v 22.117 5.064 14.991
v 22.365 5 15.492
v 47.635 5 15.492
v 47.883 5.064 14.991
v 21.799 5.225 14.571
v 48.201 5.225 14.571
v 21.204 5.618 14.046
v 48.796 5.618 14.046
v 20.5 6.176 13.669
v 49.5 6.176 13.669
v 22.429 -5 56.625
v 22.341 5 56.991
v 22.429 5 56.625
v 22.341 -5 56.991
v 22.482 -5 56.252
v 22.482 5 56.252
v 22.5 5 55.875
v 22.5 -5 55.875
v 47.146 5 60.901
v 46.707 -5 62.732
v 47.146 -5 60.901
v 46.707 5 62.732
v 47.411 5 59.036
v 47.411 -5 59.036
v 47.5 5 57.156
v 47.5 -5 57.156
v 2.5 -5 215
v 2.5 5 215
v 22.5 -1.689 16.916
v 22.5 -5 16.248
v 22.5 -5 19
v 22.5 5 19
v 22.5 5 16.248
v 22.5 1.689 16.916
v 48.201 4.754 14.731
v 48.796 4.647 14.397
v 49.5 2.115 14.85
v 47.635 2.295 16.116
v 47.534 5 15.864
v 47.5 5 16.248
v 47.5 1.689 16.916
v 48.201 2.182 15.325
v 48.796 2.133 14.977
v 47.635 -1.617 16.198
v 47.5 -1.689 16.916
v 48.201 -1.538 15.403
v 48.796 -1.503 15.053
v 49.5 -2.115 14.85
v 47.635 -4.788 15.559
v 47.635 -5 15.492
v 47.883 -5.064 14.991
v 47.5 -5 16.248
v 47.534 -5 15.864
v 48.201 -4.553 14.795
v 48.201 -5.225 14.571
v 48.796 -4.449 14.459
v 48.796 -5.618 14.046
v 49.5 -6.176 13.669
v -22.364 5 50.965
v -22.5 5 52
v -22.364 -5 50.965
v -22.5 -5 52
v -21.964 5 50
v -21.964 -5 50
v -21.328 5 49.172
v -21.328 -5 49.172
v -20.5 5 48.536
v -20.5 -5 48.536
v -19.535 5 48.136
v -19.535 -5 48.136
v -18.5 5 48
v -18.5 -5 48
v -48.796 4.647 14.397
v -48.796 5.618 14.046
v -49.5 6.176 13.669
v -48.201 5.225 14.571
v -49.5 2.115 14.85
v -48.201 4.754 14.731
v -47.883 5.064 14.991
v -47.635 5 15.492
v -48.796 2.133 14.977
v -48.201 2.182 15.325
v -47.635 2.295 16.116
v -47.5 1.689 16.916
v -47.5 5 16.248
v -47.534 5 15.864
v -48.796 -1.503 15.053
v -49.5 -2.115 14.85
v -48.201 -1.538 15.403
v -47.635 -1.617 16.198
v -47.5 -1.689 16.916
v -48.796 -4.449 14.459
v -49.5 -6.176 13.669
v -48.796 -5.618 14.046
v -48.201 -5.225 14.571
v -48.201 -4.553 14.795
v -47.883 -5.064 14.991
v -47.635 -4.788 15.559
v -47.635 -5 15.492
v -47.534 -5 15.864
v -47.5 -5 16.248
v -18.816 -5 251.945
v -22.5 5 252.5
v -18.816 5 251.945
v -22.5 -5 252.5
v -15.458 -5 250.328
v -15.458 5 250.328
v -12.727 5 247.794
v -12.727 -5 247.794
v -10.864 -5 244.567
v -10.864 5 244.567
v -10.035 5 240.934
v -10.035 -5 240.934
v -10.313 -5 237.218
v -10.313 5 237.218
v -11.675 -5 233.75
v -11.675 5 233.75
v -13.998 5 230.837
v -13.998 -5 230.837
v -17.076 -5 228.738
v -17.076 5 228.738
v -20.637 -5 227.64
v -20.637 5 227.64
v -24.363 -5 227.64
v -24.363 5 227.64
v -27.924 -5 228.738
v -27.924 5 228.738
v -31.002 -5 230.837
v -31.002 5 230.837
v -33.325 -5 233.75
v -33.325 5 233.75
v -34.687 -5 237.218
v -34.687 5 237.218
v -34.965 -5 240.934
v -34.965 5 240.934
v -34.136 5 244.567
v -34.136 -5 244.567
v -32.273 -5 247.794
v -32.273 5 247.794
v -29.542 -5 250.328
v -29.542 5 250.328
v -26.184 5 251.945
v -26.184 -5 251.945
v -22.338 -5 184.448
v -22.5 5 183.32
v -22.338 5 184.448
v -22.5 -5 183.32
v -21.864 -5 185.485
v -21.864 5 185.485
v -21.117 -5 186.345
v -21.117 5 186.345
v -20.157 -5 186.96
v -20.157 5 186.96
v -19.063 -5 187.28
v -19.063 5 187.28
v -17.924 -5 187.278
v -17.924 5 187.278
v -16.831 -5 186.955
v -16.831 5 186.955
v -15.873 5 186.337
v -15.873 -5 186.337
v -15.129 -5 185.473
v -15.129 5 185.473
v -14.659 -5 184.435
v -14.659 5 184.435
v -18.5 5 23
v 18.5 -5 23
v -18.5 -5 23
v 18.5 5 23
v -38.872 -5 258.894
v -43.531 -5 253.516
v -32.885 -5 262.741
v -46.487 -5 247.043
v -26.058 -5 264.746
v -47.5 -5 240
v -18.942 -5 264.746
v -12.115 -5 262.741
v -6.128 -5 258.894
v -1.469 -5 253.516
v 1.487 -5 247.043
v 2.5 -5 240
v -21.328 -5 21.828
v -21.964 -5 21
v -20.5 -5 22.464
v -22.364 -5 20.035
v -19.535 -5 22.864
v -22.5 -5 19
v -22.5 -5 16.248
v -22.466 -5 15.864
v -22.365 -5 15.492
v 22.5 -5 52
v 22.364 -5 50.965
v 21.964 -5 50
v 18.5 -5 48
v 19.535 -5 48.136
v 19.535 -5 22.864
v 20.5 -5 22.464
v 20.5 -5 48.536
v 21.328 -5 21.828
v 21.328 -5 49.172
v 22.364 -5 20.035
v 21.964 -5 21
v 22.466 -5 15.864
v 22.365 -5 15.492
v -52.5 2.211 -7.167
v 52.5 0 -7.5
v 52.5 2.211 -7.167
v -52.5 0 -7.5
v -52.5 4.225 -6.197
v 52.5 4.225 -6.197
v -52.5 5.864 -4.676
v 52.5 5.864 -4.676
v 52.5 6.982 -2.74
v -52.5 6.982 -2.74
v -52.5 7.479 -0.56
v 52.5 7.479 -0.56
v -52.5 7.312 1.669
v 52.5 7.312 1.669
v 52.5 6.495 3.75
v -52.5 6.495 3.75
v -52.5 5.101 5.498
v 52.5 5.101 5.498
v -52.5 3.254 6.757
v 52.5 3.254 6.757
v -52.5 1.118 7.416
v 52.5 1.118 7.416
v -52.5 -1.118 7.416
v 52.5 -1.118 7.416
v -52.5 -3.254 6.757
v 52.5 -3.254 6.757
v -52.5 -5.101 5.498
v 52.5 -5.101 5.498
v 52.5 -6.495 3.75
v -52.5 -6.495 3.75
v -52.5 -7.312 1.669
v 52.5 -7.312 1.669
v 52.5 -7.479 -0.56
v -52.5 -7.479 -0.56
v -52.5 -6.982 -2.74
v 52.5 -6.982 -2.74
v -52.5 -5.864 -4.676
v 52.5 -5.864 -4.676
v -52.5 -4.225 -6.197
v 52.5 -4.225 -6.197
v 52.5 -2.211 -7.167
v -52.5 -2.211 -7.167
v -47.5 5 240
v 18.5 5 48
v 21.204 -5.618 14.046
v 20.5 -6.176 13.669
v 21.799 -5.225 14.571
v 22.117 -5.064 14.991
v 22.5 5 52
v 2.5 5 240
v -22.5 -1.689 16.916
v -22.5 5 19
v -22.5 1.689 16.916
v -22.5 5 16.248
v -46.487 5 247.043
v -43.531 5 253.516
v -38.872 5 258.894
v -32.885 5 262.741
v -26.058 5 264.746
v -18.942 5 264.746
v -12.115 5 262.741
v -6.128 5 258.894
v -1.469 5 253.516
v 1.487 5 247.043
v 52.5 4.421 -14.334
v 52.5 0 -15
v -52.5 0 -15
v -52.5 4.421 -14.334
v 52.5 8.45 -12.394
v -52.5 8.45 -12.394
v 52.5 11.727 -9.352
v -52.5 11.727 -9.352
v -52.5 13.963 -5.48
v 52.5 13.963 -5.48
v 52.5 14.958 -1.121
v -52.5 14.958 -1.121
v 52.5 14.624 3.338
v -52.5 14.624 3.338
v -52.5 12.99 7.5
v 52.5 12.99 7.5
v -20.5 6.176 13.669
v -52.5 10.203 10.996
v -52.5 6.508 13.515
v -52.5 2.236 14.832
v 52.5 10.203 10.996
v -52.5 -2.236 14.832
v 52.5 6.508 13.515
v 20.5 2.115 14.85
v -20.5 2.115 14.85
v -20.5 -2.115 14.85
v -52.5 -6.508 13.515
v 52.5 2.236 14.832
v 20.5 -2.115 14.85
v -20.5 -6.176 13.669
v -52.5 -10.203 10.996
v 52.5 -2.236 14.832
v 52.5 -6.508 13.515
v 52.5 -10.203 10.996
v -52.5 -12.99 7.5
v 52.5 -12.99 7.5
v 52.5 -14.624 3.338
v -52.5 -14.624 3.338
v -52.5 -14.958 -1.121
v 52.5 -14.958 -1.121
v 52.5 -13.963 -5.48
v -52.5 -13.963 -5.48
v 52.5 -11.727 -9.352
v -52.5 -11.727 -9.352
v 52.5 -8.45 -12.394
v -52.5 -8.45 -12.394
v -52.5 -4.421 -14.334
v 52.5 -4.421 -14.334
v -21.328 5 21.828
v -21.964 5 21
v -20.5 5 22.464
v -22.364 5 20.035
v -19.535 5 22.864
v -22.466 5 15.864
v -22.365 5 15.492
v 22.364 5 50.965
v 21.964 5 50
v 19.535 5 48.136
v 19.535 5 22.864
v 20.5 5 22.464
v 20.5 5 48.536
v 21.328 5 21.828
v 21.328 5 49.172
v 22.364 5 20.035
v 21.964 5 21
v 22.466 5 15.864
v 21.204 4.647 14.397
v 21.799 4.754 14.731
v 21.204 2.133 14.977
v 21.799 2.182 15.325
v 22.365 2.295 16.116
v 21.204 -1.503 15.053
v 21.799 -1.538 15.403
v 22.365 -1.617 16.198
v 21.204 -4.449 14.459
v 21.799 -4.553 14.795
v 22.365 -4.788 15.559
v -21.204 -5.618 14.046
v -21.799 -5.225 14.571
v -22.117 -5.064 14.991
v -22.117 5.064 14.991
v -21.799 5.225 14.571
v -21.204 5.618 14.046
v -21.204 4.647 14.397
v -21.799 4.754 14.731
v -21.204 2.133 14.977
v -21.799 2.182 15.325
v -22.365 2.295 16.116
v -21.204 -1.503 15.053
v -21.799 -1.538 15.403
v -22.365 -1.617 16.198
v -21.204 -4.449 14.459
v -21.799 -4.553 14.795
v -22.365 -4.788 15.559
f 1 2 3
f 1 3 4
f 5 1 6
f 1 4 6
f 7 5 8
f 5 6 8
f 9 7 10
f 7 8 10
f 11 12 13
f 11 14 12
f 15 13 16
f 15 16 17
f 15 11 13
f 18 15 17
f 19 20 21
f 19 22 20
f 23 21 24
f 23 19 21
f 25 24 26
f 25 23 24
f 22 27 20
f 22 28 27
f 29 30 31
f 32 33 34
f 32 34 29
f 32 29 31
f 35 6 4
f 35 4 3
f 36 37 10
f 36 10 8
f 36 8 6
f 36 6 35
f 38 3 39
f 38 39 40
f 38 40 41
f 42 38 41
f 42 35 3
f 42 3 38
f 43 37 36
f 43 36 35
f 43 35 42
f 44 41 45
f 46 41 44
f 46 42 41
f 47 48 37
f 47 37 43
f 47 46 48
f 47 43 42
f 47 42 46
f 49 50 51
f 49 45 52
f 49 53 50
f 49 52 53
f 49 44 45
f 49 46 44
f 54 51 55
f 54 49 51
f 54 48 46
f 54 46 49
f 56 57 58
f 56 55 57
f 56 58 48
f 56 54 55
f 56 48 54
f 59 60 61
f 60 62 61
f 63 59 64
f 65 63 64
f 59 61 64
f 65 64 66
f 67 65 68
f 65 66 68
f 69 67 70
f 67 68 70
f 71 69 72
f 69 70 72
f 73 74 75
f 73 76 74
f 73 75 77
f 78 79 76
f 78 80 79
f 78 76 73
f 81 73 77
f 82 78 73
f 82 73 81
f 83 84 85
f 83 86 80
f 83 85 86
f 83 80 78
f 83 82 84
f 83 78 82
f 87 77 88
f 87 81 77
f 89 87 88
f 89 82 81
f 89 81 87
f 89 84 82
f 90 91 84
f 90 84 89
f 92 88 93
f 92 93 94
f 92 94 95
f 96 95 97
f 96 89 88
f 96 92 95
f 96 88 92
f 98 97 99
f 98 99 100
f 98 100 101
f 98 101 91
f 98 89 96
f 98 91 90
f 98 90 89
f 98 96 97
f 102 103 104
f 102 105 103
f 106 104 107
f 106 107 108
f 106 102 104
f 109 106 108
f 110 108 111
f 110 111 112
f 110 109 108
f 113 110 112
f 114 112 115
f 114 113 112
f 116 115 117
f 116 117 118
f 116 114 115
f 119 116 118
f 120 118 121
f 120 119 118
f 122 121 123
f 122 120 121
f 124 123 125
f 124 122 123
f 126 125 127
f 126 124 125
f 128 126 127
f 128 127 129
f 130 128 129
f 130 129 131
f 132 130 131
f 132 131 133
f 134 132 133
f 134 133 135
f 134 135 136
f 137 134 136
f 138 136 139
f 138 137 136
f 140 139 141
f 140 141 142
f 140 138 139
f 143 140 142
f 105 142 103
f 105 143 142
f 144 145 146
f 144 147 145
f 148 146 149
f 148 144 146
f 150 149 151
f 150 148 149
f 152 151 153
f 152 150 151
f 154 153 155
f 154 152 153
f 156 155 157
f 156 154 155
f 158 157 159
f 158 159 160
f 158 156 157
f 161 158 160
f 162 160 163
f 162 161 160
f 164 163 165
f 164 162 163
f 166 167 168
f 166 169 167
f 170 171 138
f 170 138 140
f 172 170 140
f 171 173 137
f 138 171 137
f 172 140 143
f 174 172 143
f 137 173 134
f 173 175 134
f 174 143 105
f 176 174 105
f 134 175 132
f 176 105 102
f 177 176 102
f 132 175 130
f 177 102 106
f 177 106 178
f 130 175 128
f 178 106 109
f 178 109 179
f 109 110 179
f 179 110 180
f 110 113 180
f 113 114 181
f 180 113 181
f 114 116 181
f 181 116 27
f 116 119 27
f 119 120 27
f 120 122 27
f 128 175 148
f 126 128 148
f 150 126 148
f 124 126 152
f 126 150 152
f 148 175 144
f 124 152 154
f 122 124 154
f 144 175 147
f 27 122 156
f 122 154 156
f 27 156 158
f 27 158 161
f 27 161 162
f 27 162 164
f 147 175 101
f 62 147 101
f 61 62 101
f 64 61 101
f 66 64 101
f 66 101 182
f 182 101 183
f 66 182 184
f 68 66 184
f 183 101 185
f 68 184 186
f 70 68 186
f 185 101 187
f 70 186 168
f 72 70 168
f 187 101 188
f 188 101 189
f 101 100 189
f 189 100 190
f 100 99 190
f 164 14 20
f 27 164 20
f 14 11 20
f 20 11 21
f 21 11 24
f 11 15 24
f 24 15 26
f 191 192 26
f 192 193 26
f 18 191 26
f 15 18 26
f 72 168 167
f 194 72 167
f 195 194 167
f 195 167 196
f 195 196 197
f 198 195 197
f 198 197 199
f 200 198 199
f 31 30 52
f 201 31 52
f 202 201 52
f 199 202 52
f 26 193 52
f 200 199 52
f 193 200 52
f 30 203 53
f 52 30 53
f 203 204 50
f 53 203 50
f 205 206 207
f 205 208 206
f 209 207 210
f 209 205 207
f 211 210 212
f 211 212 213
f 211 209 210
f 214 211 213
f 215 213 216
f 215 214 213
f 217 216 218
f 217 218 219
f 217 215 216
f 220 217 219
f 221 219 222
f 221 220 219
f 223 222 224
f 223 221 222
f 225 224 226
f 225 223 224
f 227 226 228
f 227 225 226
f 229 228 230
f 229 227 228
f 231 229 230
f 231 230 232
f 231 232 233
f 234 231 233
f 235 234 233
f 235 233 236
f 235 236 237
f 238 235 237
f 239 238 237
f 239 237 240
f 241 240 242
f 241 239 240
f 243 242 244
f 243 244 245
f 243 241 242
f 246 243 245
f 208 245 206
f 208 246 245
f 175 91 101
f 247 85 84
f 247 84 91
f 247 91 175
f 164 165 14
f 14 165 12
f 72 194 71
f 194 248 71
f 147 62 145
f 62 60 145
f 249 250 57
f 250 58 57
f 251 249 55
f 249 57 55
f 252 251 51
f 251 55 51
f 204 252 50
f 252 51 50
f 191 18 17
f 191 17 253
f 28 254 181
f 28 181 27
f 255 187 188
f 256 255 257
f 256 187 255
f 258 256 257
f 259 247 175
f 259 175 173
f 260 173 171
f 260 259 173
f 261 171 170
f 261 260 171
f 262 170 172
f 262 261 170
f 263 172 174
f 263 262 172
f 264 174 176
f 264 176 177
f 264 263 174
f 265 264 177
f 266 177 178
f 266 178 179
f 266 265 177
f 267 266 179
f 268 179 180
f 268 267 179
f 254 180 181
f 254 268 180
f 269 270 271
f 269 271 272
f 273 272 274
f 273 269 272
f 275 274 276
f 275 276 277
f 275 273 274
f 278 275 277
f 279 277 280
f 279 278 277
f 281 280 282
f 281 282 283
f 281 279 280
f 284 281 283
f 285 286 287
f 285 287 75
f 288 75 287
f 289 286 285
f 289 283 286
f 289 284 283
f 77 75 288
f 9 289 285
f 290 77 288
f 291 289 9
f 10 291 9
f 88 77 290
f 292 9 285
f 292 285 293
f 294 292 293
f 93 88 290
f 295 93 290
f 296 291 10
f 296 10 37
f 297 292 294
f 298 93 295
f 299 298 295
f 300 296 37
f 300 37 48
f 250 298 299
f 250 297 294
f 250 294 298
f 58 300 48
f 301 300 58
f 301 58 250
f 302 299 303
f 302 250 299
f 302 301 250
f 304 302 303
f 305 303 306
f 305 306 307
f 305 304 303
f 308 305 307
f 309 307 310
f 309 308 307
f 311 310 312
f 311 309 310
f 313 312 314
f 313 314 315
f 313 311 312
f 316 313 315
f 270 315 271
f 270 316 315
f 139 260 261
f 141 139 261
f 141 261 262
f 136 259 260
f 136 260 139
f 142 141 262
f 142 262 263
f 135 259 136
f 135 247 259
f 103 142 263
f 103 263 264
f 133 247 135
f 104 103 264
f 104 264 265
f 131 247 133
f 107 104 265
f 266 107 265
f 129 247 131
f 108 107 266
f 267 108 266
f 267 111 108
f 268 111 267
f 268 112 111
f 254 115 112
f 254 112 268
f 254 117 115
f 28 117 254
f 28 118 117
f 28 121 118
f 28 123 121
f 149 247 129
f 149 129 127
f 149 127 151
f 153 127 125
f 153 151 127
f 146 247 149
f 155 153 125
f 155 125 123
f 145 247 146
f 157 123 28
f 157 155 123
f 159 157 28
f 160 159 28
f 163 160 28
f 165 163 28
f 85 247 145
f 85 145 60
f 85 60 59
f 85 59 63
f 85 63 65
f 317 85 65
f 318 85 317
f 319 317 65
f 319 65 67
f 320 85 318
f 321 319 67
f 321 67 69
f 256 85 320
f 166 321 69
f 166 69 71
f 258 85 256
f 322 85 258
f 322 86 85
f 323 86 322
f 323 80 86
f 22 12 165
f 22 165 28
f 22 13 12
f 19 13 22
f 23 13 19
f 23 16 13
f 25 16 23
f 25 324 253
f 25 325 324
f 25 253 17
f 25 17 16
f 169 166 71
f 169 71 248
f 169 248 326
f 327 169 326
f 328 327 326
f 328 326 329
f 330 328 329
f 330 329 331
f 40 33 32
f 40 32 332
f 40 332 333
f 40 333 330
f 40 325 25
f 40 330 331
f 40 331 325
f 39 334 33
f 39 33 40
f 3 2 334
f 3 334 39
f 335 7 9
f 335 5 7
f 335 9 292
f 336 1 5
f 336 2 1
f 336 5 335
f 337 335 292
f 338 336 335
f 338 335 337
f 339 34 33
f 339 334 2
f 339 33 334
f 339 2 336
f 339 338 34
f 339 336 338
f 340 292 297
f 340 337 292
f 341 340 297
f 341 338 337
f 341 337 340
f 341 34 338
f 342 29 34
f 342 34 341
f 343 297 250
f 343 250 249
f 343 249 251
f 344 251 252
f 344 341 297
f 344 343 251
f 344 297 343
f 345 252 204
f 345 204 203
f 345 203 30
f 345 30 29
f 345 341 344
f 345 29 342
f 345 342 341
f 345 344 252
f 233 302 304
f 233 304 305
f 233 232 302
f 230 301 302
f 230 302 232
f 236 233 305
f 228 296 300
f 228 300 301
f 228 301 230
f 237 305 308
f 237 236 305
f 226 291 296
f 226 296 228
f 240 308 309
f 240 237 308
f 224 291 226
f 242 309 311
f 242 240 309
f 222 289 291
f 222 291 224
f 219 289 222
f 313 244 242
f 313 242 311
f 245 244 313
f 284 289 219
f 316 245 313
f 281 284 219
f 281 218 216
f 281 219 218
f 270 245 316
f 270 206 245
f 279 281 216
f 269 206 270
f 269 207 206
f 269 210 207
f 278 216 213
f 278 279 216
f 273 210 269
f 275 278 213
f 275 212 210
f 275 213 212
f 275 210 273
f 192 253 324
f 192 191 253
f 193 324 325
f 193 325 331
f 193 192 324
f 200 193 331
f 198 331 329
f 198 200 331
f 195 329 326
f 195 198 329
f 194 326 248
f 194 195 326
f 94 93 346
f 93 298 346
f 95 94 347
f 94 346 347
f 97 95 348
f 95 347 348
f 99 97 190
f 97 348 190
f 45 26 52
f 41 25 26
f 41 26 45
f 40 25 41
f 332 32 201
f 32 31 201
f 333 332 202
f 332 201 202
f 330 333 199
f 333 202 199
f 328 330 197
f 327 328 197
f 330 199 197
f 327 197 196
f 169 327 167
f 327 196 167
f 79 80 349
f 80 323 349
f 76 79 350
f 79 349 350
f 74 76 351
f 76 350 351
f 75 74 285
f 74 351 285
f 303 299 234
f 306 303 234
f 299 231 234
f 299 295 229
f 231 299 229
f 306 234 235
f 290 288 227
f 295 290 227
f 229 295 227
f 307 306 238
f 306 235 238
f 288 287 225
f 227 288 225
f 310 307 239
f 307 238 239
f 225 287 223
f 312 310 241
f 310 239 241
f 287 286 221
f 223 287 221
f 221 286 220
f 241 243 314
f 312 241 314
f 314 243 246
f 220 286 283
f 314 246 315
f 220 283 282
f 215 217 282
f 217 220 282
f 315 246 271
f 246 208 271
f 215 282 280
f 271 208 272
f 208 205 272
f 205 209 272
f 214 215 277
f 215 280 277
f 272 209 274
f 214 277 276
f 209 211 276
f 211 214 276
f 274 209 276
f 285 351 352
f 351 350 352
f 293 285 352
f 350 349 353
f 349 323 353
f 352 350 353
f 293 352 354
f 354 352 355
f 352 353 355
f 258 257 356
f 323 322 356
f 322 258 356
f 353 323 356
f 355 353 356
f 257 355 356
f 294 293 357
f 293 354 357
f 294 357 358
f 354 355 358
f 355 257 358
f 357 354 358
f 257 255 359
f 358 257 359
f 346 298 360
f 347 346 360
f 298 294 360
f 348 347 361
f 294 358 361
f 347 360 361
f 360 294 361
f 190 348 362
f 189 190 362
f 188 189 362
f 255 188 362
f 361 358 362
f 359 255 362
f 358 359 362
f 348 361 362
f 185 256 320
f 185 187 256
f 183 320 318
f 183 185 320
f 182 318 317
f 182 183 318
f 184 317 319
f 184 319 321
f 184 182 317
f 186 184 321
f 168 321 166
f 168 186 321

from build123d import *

# Parameters (mm, degrees)
SKETCH_1_R      = 15
SKETCH_1_R_2    = 7.5
EXTRUDE_1_DEPTH = 52.5
SKETCH_2_R      = 12.5
EXTRUDE_2_DEPTH = 5
FILLET_1_R      = 4
FILLET_2_R      = 20
FILLET_3_R      = 2


with BuildPart() as part:
    # 스케치1 → 보스-돌출1 (new, symmetric)
    with BuildSketch(Plane(origin=(0, 0, 0), x_dir=(0, 0, -1), z_dir=(1, 0, 0))):
        Circle(SKETCH_1_R)
        Circle(SKETCH_1_R_2, mode=Mode.SUBTRACT)
    extrude(amount=EXTRUDE_1_DEPTH, both=True)

    # 스케치2 → 보스-돌출2 (add, symmetric)
    with BuildSketch(Plane(origin=(0, 0, 0), x_dir=(1, 0, 0), z_dir=(0, 1, 0))):
        with BuildLine():
            Line((-47.5, -12), (-47.5, -240))
            ThreePointArc((-47.5, -240), (-22.5, -265), (2.5, -240))
            Line((2.5, -240), (2.5, -215))
            Line((2.5, -215), (47.5, -60))
            Line((47.5, -60), (47.5, -12))
            Line((47.5, -12), (22.5, -12))
            Line((22.5, -12), (22.5, -23))
            Line((22.5, -23), (-22.5, -23))
            Line((-22.5, -23), (-22.5, -12))
            Line((-22.5, -12), (-47.5, -12))
        make_face()
        with Locations(Location((-22.5, -240, 0), (0, 0, 270))):
            Circle(SKETCH_2_R, mode=Mode.SUBTRACT)
        with BuildLine():
            Line((-14.658615093, -184.435160923), (22.5, -56.444375602))
            Line((22.5, -56.444375602), (22.5, -48))
            Line((22.5, -48), (-22.5, -48))
            Line((-22.5, -48), (-22.5, -183.319920143))
            ThreePointArc((-22.5, -183.319920143), (-19.063231911, -187.280067844), (-14.658615093, -184.435160923))
        make_face(mode=Mode.SUBTRACT)
    extrude(amount=EXTRUDE_2_DEPTH, both=True)

    # 필렛1
    fillet_1_edges = [part.edges().sort_by_distance(p)[0] for p in [
        (22.5, 0, 23),
        (-22.5, 0, 23),
        (22.5, 0, 48),
        (-22.5, 0, 48),
        (22.5, 0, 56.444375602),
    ]]
    fillet(fillet_1_edges, radius=FILLET_1_R)

    # 필렛2
    fillet_2_edges = [part.edges().sort_by_distance(p)[0] for p in [
        (47.5, 0, 60),
    ]]
    fillet(fillet_2_edges, radius=FILLET_2_R)

    # 필렛3
    fillet_3_edges = [part.edges().sort_by_distance(p)[0] for p in [
        (-47.5, 0, 15),
        (-35, -5, 14.142135624),
        (-35, 5, 14.142135624),
        (-22.5, 0, 15),
        (22.5, 0, 15),
        (35, -5, 14.142135624),
        (35, 5, 14.142135624),
        (47.5, 0, 15),
    ]]
    fillet(fillet_3_edges, radius=FILLET_3_R)


solid = part.part
